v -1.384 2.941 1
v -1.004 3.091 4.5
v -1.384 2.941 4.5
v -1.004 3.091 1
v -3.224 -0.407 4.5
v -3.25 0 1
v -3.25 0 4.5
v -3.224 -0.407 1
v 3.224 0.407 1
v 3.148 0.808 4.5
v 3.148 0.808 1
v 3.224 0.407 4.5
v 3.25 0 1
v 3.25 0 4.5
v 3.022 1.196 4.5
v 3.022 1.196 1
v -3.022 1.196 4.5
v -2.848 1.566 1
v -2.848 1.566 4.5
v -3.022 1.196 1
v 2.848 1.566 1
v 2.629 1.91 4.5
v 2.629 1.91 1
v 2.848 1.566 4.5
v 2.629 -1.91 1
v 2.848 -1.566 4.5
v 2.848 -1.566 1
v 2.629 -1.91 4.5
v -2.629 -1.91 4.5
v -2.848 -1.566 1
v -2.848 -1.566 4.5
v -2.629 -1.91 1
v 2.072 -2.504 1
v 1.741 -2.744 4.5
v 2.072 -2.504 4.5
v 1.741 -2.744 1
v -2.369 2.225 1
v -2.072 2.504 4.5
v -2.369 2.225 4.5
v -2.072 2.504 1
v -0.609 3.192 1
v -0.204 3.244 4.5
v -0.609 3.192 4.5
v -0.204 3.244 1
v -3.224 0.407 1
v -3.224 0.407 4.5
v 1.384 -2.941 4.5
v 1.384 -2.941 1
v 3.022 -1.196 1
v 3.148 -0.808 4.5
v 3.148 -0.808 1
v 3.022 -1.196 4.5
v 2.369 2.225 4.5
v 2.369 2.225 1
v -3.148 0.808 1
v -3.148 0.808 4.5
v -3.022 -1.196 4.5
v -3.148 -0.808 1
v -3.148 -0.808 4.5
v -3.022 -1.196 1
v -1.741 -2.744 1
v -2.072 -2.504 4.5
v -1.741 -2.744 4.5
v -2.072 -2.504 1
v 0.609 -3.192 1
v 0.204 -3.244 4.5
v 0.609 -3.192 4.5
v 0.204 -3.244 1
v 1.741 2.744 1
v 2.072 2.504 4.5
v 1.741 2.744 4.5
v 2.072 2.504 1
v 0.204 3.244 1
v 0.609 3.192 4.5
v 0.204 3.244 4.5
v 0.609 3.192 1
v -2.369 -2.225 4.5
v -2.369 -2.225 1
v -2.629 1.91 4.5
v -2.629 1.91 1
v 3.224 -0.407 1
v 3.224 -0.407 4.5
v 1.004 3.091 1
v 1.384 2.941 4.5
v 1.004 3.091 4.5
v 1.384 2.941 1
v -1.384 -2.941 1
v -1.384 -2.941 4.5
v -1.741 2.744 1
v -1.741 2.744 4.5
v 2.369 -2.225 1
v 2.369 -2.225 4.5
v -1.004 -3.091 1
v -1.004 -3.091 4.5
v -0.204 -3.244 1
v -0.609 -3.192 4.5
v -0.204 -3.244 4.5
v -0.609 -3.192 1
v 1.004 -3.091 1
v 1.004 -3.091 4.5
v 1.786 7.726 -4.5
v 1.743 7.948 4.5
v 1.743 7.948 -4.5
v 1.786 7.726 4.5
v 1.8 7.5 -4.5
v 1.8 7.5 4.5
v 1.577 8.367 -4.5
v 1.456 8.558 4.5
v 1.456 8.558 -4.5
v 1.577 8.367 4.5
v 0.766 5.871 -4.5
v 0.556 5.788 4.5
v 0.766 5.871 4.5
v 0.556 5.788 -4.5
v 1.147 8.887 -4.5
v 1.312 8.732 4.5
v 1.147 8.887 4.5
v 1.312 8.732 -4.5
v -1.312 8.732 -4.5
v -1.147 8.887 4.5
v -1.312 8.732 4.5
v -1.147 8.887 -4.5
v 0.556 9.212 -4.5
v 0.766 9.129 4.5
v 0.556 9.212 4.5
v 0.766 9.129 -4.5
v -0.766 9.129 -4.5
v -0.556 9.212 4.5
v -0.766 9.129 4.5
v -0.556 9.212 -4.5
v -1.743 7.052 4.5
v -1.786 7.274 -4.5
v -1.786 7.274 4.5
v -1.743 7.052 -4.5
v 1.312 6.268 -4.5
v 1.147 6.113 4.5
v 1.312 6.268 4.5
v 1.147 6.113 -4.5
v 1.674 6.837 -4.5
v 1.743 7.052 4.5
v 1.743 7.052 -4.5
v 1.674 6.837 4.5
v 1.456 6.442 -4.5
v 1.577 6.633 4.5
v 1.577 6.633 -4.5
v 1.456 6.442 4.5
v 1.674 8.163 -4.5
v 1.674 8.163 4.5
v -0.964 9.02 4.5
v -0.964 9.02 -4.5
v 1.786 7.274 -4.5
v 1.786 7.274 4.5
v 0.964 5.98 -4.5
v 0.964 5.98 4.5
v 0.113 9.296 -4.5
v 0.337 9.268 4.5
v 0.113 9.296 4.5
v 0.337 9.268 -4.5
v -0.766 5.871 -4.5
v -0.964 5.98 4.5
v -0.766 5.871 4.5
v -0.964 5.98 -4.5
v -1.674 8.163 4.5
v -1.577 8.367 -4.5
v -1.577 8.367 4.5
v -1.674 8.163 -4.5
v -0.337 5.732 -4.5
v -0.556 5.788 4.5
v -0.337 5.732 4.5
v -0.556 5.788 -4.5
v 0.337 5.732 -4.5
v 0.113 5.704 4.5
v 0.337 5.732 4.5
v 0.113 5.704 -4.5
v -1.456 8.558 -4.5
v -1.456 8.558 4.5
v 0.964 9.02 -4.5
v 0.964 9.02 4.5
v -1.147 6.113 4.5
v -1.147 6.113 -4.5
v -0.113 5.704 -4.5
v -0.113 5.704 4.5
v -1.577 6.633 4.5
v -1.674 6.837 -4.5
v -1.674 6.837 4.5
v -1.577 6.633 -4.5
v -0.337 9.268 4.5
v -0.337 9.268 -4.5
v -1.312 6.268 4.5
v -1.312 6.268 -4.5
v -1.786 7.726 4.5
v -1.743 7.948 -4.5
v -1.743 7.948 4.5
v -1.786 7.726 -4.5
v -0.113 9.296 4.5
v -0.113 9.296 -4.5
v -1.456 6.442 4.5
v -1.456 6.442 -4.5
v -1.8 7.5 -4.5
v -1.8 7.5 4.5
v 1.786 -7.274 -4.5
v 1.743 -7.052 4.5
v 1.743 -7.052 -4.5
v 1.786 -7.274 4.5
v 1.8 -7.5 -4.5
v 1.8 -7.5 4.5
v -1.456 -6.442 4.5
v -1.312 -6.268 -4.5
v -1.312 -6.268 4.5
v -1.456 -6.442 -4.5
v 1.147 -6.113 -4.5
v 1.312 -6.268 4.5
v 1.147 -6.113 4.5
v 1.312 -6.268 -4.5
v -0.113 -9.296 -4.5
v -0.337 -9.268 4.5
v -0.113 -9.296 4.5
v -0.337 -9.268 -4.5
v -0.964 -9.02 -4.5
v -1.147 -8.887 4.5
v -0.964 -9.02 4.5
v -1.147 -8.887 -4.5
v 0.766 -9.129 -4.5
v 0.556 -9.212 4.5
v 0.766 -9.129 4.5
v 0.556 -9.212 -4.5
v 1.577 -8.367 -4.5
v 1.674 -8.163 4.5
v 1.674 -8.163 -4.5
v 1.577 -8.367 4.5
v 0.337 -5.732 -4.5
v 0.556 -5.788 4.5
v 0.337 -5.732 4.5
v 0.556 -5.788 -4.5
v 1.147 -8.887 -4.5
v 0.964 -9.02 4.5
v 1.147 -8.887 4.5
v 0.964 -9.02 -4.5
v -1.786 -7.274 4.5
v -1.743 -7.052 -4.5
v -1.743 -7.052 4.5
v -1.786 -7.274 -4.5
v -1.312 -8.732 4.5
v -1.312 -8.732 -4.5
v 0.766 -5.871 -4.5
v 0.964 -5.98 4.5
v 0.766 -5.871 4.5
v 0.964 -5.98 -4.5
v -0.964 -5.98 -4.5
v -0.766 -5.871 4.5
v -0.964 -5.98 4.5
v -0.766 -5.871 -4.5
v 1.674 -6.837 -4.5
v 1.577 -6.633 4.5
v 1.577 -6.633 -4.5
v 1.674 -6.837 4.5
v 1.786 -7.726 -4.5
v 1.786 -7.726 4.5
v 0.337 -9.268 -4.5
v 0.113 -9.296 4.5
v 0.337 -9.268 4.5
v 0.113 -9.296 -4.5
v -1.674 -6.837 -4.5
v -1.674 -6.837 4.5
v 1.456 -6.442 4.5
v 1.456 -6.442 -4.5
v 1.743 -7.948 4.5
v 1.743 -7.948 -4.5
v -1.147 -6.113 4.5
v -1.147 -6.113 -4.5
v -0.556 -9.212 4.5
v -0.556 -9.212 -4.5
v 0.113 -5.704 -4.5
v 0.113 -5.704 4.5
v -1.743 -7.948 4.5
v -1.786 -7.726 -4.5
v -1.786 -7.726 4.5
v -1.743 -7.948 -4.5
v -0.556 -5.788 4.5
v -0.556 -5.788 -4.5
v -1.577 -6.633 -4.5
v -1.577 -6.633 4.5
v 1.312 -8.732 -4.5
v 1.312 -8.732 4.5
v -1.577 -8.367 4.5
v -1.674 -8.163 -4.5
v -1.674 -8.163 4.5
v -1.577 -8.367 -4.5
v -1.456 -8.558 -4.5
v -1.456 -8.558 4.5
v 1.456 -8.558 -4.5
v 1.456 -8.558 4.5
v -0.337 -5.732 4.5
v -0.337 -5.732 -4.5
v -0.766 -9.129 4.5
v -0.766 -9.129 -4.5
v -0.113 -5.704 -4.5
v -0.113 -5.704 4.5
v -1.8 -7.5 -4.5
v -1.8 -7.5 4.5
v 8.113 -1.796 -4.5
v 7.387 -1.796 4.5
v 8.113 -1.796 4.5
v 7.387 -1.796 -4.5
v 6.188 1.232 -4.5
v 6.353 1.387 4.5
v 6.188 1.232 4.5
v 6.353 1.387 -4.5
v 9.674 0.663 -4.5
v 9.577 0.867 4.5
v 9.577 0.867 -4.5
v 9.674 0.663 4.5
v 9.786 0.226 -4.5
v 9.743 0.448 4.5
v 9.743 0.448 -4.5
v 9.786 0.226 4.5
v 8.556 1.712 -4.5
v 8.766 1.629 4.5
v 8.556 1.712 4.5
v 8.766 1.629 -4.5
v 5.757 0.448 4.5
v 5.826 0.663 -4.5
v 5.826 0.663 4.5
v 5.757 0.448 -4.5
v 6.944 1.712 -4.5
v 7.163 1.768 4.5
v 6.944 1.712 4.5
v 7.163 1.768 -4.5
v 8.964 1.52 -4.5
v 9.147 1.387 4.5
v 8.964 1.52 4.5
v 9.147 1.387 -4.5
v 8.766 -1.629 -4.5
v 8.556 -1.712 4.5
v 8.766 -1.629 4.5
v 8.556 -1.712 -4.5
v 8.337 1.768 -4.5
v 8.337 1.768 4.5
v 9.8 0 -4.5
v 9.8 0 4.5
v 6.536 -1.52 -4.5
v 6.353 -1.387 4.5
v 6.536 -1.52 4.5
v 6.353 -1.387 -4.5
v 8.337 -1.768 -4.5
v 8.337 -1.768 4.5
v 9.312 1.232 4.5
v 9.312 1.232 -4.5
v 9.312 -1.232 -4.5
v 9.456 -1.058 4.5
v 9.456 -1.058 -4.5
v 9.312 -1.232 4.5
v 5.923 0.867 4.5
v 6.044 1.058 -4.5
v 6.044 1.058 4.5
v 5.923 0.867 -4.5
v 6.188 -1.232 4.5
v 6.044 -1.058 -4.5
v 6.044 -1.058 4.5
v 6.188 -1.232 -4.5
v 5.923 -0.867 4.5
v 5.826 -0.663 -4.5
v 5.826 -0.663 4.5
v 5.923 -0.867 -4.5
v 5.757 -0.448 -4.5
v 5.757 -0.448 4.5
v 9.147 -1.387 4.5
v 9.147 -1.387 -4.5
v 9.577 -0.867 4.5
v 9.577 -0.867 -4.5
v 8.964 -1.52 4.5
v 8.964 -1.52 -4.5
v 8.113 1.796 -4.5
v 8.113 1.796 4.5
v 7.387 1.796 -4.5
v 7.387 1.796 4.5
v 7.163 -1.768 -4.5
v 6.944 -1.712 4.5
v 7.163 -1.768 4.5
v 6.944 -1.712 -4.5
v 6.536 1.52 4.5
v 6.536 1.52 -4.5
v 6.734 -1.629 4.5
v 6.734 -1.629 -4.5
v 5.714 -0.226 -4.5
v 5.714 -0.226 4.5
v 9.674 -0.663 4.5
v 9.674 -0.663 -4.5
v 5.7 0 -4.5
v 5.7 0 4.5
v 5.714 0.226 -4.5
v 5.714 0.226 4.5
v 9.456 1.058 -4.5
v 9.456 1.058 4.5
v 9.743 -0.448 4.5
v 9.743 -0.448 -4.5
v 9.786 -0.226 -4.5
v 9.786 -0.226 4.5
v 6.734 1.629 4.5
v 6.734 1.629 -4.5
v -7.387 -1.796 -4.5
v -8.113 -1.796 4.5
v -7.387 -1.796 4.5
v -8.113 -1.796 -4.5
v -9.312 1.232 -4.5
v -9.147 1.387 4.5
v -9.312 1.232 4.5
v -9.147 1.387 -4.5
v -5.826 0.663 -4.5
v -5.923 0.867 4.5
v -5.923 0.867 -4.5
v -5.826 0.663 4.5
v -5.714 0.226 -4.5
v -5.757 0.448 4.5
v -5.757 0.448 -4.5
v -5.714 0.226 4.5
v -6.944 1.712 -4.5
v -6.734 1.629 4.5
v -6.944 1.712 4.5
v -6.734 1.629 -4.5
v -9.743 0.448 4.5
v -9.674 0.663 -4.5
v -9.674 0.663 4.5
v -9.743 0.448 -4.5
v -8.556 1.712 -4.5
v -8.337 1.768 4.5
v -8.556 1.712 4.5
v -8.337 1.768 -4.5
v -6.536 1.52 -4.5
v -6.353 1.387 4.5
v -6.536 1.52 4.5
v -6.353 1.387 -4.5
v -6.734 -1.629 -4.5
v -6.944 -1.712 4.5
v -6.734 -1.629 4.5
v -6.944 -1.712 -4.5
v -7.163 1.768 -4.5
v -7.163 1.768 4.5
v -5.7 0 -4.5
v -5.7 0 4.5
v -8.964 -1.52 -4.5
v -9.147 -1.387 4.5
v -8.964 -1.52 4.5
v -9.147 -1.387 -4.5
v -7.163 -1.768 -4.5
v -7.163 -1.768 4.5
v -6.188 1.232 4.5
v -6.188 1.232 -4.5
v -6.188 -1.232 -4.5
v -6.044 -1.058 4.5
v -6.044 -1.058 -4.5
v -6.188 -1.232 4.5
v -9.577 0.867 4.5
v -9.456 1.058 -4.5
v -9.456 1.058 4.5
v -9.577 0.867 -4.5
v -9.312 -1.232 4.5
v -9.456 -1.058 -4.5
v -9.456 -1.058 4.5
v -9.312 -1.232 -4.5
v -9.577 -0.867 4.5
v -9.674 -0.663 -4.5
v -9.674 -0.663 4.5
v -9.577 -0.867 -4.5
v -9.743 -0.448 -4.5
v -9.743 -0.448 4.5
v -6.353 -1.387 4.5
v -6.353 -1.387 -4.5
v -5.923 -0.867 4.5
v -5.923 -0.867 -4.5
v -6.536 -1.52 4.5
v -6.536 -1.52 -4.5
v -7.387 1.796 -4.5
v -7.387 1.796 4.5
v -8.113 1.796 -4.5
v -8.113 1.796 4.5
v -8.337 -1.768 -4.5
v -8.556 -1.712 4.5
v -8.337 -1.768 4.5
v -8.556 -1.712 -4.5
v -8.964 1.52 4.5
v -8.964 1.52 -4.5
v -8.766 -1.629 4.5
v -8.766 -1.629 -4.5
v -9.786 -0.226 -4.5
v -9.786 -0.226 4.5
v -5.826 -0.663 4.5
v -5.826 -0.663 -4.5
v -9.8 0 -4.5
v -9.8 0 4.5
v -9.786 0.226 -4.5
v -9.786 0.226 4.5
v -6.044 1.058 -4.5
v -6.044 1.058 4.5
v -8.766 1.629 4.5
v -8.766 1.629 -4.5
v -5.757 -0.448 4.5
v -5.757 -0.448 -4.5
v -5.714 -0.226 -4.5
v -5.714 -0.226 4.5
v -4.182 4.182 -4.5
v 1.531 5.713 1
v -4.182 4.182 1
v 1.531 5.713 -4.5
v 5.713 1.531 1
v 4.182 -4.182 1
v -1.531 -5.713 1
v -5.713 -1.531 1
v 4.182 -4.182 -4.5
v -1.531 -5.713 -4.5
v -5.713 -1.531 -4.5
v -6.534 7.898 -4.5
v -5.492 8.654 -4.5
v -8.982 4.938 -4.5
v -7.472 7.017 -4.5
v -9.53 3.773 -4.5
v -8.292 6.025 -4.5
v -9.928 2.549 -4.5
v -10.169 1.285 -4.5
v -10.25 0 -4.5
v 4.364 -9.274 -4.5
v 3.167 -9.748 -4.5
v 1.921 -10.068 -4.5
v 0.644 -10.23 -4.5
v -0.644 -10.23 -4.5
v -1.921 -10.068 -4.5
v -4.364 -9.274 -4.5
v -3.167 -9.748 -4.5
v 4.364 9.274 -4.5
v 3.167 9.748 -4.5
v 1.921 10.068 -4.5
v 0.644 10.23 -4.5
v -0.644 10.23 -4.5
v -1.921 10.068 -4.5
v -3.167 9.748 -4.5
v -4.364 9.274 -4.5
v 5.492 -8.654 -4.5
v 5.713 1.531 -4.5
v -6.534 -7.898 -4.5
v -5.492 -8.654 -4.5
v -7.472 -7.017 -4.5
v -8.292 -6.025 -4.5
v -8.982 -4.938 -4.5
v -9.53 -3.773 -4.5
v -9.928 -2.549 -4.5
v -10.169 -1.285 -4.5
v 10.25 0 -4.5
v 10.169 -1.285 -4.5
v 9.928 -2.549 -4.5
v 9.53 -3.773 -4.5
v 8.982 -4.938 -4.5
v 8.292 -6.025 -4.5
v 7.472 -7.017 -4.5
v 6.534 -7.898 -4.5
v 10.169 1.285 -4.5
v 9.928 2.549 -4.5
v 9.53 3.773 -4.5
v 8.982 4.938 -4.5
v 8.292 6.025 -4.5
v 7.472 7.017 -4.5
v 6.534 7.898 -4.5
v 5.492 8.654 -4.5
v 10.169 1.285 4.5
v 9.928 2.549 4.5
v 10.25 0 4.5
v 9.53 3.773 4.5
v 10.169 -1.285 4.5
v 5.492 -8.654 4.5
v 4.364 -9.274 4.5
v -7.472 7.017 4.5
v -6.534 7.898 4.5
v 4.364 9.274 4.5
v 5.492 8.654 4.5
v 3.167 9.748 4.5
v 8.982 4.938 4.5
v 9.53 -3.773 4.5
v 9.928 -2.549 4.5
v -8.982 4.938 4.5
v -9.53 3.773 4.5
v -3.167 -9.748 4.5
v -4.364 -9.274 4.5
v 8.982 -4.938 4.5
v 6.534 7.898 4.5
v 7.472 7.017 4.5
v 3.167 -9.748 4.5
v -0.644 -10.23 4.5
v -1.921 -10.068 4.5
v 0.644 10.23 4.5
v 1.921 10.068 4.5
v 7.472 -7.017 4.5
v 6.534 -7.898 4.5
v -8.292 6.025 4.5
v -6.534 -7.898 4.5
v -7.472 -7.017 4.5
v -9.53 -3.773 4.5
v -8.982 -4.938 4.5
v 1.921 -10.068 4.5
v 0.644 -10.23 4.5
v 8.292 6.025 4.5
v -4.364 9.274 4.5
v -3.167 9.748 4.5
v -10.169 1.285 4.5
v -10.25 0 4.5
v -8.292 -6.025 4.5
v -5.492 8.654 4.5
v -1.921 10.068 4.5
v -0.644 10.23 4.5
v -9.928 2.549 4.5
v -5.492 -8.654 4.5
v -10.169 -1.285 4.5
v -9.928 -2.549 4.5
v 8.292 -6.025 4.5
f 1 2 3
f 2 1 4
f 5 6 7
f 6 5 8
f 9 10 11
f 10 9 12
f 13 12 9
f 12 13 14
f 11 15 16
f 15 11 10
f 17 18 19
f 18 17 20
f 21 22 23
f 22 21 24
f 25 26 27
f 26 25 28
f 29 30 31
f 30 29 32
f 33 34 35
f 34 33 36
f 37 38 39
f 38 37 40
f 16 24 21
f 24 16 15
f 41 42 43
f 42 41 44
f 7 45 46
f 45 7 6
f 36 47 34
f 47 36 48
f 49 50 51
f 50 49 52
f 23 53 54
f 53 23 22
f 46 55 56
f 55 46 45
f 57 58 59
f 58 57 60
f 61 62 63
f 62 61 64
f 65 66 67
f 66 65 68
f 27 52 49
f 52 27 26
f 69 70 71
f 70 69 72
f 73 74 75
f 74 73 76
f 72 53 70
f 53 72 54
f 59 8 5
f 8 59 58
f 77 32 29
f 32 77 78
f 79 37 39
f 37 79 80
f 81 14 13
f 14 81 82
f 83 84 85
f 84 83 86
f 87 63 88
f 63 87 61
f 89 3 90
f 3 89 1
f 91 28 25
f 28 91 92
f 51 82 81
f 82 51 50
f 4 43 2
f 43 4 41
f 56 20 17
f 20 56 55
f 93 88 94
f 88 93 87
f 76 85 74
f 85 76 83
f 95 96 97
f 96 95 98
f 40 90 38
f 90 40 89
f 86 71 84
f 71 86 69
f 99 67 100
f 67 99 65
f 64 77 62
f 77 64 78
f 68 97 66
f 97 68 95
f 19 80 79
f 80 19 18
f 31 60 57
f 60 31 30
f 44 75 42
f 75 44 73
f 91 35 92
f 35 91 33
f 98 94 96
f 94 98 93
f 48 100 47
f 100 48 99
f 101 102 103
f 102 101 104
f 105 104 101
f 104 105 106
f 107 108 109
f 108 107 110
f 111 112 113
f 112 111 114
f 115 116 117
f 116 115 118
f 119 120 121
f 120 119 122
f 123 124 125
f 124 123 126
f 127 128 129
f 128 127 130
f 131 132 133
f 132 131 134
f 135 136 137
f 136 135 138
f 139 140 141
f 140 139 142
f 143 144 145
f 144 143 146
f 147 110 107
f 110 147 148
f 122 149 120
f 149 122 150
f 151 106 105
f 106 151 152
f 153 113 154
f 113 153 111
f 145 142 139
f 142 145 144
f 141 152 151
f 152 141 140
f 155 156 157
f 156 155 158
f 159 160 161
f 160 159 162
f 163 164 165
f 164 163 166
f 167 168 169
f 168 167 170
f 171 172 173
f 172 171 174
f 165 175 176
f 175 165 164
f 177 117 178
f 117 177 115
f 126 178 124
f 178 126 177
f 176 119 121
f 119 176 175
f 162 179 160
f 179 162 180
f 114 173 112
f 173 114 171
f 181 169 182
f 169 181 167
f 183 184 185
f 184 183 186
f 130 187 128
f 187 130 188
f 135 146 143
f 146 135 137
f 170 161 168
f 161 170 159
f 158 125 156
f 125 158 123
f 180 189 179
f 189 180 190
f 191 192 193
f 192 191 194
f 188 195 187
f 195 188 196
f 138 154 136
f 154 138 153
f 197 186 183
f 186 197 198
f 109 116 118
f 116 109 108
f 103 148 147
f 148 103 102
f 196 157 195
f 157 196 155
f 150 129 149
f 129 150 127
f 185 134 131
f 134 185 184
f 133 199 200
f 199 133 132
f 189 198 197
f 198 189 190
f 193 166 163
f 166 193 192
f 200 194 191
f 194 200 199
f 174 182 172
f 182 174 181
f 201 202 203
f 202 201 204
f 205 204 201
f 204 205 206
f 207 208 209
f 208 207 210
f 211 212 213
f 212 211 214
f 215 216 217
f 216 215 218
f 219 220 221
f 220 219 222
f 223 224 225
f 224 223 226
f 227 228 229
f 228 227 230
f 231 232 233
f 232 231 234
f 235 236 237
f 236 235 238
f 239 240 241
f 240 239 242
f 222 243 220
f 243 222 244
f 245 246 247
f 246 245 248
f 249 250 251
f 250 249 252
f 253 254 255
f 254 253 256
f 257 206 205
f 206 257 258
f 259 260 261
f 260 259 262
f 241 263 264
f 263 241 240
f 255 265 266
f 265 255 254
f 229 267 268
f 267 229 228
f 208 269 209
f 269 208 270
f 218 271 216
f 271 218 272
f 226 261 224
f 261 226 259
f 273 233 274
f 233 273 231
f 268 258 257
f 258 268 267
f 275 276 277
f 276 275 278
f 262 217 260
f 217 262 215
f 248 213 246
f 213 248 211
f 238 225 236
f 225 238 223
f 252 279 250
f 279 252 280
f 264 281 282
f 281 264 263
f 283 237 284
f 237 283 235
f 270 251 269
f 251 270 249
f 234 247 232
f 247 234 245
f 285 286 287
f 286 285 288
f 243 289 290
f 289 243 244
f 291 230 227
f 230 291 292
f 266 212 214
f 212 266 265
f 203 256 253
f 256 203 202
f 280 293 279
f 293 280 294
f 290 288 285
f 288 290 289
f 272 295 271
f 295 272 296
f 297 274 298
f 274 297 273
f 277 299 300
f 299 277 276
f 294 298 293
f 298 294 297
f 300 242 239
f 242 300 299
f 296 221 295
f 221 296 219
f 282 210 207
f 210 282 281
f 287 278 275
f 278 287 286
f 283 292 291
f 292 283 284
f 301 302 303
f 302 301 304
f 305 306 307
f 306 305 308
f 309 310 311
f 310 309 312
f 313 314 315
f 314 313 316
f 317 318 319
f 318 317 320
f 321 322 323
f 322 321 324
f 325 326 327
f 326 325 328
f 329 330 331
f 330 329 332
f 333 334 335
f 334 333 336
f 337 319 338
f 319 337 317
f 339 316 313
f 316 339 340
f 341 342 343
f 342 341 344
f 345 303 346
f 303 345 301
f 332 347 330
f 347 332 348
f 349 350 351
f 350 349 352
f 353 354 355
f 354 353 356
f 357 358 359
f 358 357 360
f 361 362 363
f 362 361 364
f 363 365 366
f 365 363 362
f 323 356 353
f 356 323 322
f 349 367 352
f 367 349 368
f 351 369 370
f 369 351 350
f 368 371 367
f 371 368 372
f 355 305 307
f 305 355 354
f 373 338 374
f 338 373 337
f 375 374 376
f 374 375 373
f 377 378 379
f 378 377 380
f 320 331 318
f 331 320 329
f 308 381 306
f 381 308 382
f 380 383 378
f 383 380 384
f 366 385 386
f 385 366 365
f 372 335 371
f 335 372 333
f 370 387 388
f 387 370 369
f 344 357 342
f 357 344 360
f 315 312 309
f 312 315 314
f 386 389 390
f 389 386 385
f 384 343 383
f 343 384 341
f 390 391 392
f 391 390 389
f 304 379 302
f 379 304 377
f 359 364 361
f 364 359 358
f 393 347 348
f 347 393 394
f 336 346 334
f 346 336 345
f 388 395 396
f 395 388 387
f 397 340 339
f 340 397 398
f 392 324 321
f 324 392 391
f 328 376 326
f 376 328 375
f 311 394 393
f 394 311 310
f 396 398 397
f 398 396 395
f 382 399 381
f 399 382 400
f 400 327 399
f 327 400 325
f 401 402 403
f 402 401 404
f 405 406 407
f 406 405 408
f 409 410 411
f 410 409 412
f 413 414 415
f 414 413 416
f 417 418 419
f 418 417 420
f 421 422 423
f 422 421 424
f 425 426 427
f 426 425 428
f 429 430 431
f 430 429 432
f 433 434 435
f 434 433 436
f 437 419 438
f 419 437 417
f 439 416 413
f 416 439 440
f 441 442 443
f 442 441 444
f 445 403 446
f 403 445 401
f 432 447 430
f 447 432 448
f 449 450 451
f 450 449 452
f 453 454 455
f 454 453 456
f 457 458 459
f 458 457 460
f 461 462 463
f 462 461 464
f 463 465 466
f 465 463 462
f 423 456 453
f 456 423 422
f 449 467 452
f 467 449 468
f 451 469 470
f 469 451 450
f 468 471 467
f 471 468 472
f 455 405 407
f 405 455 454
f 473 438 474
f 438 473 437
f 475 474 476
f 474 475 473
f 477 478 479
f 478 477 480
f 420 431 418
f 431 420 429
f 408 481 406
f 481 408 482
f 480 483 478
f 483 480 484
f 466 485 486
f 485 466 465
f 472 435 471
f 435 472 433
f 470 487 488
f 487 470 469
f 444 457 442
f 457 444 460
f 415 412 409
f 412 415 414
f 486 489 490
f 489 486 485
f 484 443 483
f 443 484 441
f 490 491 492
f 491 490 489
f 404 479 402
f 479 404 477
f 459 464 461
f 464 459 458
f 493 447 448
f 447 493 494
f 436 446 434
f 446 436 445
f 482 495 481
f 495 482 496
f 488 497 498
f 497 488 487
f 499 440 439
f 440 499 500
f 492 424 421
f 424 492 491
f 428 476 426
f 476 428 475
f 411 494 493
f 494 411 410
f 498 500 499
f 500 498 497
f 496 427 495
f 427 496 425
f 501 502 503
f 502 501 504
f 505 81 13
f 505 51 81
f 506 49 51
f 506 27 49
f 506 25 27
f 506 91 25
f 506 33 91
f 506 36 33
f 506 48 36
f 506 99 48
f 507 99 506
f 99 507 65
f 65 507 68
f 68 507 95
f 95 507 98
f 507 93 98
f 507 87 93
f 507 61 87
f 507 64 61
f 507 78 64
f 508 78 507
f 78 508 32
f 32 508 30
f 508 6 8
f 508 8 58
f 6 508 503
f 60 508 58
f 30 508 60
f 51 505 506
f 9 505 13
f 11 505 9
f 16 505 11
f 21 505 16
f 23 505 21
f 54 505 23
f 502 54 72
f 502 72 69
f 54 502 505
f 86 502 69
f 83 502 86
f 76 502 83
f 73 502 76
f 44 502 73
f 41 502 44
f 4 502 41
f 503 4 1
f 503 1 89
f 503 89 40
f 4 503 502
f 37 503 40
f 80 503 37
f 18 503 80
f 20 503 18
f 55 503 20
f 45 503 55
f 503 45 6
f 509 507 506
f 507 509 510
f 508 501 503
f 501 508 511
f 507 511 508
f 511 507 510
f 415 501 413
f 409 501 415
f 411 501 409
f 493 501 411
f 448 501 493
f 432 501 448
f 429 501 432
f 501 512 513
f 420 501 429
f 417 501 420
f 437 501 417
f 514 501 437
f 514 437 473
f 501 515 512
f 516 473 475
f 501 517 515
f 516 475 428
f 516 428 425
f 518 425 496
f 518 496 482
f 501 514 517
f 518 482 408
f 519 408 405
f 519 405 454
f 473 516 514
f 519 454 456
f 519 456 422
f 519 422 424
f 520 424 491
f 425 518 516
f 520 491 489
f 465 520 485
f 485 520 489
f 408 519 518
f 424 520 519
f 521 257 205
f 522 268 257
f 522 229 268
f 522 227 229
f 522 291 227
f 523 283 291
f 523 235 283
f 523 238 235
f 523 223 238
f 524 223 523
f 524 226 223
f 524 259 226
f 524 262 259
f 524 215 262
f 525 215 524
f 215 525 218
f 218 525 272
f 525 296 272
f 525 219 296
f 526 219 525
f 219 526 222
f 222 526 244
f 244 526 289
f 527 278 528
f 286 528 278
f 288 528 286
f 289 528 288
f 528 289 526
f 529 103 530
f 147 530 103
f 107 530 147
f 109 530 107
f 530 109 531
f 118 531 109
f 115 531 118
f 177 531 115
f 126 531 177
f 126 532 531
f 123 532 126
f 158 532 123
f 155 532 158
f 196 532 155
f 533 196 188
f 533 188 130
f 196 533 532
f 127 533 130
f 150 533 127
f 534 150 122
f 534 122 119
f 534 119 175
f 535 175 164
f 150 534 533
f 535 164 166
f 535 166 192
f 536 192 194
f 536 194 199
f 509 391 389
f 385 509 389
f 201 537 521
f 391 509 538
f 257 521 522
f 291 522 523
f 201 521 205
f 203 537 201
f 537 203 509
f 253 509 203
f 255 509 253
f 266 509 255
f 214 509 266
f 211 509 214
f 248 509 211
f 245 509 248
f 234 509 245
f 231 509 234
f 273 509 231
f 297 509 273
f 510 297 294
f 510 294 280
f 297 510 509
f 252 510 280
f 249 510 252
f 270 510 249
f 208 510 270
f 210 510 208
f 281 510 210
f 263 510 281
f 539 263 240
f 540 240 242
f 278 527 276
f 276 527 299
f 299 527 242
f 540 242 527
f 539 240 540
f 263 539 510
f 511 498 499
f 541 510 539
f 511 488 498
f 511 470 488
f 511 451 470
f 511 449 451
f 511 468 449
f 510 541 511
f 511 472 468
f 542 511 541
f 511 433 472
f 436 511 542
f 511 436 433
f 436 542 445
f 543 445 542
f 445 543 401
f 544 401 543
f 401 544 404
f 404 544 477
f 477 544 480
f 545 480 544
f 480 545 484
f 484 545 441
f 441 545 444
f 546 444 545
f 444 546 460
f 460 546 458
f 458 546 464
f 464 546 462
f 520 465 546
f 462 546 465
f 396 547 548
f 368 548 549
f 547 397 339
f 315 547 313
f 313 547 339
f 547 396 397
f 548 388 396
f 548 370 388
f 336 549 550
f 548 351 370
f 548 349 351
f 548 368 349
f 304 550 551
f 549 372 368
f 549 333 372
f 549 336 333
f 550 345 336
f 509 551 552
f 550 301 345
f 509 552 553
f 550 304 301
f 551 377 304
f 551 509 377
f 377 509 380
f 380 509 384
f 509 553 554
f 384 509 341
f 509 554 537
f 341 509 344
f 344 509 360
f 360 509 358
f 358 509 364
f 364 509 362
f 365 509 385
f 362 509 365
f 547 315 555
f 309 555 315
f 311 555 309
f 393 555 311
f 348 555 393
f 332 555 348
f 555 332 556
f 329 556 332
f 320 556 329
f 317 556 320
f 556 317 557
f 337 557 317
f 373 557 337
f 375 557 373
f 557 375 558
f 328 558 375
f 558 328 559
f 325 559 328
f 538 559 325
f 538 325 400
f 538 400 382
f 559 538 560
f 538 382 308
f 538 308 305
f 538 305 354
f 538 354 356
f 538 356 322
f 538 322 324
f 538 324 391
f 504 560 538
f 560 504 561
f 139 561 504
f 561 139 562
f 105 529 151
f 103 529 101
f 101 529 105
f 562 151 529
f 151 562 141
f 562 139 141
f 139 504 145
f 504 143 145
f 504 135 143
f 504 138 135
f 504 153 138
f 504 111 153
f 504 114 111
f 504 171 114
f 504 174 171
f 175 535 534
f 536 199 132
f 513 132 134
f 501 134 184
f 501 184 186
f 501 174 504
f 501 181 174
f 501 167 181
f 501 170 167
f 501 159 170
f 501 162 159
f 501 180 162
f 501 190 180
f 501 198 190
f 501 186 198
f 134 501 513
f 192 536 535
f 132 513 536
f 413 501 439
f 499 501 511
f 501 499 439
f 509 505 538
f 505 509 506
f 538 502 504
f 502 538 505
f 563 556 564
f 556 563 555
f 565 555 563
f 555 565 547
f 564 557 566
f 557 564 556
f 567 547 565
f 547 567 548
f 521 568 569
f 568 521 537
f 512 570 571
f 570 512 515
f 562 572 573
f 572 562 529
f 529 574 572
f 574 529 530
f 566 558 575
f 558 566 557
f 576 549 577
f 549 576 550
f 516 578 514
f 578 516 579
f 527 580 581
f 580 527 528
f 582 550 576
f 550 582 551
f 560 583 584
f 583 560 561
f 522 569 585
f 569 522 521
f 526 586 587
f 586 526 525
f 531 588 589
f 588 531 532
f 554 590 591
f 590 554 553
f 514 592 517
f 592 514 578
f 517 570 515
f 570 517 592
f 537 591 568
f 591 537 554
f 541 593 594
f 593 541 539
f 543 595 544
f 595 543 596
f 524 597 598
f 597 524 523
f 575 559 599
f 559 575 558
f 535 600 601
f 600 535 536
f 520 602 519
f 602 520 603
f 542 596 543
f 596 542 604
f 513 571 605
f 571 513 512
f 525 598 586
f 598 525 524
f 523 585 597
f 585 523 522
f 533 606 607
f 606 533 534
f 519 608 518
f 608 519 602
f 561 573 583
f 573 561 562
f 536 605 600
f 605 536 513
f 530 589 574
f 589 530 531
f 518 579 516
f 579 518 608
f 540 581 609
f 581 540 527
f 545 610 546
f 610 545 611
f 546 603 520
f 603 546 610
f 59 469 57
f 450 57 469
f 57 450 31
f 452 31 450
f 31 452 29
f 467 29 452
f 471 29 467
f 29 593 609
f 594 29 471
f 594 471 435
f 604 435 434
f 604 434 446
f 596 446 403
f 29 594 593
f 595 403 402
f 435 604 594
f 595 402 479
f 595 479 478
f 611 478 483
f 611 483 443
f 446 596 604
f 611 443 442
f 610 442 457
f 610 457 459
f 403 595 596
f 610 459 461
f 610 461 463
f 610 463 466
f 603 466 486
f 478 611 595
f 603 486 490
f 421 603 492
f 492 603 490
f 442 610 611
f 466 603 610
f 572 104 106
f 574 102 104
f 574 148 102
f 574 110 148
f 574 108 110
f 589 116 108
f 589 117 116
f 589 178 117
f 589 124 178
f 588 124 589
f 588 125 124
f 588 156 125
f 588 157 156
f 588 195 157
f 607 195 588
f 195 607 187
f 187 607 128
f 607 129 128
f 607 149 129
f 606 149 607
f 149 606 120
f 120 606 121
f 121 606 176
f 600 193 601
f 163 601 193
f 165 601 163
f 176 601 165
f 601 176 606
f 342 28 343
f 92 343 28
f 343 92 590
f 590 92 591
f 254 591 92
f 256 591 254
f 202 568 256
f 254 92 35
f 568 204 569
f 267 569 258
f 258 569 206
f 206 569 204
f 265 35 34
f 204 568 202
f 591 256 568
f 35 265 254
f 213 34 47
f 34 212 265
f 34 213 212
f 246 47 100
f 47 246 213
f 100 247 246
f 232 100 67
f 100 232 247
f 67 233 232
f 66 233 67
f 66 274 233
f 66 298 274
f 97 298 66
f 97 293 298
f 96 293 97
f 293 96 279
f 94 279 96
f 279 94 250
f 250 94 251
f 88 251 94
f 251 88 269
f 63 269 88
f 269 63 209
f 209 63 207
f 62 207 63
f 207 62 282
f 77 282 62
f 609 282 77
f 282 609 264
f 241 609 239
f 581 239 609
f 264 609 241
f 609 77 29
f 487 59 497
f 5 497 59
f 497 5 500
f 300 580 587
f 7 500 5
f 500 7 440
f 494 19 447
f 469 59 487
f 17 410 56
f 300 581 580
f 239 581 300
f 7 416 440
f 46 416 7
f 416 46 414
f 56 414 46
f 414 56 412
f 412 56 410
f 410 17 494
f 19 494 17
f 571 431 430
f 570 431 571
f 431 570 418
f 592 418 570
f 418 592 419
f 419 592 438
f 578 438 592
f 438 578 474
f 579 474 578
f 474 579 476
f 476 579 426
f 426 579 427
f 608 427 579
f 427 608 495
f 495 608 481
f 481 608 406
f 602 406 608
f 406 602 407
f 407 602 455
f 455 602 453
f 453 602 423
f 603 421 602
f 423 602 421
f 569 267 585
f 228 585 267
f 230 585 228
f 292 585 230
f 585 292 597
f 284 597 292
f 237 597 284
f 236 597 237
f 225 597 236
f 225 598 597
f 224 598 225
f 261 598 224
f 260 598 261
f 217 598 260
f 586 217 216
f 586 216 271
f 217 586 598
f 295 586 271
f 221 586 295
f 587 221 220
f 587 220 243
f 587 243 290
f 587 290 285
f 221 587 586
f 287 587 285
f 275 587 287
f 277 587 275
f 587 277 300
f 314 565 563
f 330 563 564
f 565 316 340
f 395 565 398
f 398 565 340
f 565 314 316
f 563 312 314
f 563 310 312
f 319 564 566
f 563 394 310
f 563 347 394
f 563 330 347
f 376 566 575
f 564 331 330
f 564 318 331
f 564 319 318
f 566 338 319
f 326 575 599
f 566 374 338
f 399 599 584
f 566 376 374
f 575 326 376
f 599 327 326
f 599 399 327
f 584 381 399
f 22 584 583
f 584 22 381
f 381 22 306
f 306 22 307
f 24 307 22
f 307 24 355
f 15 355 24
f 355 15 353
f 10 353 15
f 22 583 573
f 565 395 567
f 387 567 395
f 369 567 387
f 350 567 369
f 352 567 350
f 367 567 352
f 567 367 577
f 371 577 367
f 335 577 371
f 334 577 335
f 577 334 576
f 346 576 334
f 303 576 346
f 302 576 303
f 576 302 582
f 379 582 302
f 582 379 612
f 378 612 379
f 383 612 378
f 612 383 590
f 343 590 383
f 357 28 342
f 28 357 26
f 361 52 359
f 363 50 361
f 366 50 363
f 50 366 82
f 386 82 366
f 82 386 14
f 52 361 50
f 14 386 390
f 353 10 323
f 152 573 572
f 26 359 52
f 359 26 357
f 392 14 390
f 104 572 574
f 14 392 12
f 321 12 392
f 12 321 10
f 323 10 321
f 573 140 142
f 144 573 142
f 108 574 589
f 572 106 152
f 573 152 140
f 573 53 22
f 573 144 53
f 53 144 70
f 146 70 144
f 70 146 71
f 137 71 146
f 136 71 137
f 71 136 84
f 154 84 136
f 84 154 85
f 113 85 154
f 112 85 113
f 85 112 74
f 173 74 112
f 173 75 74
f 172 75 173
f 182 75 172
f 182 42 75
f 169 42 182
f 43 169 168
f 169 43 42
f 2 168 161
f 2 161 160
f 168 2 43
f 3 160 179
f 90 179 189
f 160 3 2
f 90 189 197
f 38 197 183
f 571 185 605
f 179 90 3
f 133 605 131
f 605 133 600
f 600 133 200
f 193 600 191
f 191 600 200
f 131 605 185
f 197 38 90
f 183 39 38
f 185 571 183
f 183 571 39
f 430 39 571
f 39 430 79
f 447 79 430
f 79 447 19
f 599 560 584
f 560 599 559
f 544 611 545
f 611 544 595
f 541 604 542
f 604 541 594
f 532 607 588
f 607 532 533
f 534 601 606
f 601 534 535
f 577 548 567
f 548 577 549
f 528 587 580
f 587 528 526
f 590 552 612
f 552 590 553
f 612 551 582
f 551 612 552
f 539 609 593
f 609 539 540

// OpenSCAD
$fn = 50;


difference() {
	union() {
		translate(v = [0, 0, -4.5000000000]) {
			rotate(a = [0, 0, 0]) {
				cylinder(h = 9, r = 10.2500000000);
			}
		}
	}
	union() {
		translate(v = [0, 0, -125.0000000000]) {
			rotate(a = [0, 0, 0]) {
				cylinder(h = 250, r = 3.2500000000);
			}
		}
		translate(v = [0, 7.5000000000, -125.0000000000]) {
			rotate(a = [0, 0, 0]) {
				cylinder(h = 250, r = 1.8000000000);
			}
		}
		translate(v = [0, -7.5000000000, -125.0000000000]) {
			rotate(a = [0, 0, 0]) {
				cylinder(h = 250, r = 1.8000000000);
			}
		}
		translate(v = [7.7500000000, 0, -125.0000000000]) {
			rotate(a = [0, 0, 0]) {
				hull() {
					translate(v = [0.2500000000, 0, 0]) {
						rotate(a = [0, 0, 0]) {
							translate(v = [0, 0, 0]) {
								rotate(a = [0, 0, 0]) {
									cylinder(h = 250, r = 1.8000000000);
								}
							}
						}
					}
					translate(v = [-0.2500000000, 0, 0]) {
						rotate(a = [0, 0, 0]) {
							translate(v = [0, 0, 0]) {
								rotate(a = [0, 0, 0]) {
									cylinder(h = 250, r = 1.8000000000);
								}
							}
						}
					}
				}
			}
		}
		translate(v = [-7.7500000000, 0, -125.0000000000]) {
			rotate(a = [0, 0, 0]) {
				hull() {
					translate(v = [0.2500000000, 0, 0]) {
						rotate(a = [0, 0, 0]) {
							translate(v = [0, 0, 0]) {
								rotate(a = [0, 0, 0]) {
									cylinder(h = 250, r = 1.8000000000);
								}
							}
						}
					}
					translate(v = [-0.2500000000, 0, 0]) {
						rotate(a = [0, 0, 0]) {
							translate(v = [0, 0, 0]) {
								rotate(a = [0, 0, 0]) {
									cylinder(h = 250, r = 1.8000000000);
								}
							}
						}
					}
				}
			}
		}
		translate(v = [0, 0, -4.5000000000]) {
			rotate(a = [0, 0, 15.0000000000]) {
				translate(v = [0, 0, 0]) {
					rotate(a = [0, 0, 0]) {
						linear_extrude(height = 5.5000000000) {
							polygon(points = [[5.9142500000, 0.0000000000], [2.9571250000, 5.1218907443], [-2.9571250000, 5.1218907443], [-5.9142500000, 0.0000000000], [-2.9571250000, -5.1218907443], [2.9571250000, -5.1218907443]]);
						}
					}
				}
			}
		}
	}
}
